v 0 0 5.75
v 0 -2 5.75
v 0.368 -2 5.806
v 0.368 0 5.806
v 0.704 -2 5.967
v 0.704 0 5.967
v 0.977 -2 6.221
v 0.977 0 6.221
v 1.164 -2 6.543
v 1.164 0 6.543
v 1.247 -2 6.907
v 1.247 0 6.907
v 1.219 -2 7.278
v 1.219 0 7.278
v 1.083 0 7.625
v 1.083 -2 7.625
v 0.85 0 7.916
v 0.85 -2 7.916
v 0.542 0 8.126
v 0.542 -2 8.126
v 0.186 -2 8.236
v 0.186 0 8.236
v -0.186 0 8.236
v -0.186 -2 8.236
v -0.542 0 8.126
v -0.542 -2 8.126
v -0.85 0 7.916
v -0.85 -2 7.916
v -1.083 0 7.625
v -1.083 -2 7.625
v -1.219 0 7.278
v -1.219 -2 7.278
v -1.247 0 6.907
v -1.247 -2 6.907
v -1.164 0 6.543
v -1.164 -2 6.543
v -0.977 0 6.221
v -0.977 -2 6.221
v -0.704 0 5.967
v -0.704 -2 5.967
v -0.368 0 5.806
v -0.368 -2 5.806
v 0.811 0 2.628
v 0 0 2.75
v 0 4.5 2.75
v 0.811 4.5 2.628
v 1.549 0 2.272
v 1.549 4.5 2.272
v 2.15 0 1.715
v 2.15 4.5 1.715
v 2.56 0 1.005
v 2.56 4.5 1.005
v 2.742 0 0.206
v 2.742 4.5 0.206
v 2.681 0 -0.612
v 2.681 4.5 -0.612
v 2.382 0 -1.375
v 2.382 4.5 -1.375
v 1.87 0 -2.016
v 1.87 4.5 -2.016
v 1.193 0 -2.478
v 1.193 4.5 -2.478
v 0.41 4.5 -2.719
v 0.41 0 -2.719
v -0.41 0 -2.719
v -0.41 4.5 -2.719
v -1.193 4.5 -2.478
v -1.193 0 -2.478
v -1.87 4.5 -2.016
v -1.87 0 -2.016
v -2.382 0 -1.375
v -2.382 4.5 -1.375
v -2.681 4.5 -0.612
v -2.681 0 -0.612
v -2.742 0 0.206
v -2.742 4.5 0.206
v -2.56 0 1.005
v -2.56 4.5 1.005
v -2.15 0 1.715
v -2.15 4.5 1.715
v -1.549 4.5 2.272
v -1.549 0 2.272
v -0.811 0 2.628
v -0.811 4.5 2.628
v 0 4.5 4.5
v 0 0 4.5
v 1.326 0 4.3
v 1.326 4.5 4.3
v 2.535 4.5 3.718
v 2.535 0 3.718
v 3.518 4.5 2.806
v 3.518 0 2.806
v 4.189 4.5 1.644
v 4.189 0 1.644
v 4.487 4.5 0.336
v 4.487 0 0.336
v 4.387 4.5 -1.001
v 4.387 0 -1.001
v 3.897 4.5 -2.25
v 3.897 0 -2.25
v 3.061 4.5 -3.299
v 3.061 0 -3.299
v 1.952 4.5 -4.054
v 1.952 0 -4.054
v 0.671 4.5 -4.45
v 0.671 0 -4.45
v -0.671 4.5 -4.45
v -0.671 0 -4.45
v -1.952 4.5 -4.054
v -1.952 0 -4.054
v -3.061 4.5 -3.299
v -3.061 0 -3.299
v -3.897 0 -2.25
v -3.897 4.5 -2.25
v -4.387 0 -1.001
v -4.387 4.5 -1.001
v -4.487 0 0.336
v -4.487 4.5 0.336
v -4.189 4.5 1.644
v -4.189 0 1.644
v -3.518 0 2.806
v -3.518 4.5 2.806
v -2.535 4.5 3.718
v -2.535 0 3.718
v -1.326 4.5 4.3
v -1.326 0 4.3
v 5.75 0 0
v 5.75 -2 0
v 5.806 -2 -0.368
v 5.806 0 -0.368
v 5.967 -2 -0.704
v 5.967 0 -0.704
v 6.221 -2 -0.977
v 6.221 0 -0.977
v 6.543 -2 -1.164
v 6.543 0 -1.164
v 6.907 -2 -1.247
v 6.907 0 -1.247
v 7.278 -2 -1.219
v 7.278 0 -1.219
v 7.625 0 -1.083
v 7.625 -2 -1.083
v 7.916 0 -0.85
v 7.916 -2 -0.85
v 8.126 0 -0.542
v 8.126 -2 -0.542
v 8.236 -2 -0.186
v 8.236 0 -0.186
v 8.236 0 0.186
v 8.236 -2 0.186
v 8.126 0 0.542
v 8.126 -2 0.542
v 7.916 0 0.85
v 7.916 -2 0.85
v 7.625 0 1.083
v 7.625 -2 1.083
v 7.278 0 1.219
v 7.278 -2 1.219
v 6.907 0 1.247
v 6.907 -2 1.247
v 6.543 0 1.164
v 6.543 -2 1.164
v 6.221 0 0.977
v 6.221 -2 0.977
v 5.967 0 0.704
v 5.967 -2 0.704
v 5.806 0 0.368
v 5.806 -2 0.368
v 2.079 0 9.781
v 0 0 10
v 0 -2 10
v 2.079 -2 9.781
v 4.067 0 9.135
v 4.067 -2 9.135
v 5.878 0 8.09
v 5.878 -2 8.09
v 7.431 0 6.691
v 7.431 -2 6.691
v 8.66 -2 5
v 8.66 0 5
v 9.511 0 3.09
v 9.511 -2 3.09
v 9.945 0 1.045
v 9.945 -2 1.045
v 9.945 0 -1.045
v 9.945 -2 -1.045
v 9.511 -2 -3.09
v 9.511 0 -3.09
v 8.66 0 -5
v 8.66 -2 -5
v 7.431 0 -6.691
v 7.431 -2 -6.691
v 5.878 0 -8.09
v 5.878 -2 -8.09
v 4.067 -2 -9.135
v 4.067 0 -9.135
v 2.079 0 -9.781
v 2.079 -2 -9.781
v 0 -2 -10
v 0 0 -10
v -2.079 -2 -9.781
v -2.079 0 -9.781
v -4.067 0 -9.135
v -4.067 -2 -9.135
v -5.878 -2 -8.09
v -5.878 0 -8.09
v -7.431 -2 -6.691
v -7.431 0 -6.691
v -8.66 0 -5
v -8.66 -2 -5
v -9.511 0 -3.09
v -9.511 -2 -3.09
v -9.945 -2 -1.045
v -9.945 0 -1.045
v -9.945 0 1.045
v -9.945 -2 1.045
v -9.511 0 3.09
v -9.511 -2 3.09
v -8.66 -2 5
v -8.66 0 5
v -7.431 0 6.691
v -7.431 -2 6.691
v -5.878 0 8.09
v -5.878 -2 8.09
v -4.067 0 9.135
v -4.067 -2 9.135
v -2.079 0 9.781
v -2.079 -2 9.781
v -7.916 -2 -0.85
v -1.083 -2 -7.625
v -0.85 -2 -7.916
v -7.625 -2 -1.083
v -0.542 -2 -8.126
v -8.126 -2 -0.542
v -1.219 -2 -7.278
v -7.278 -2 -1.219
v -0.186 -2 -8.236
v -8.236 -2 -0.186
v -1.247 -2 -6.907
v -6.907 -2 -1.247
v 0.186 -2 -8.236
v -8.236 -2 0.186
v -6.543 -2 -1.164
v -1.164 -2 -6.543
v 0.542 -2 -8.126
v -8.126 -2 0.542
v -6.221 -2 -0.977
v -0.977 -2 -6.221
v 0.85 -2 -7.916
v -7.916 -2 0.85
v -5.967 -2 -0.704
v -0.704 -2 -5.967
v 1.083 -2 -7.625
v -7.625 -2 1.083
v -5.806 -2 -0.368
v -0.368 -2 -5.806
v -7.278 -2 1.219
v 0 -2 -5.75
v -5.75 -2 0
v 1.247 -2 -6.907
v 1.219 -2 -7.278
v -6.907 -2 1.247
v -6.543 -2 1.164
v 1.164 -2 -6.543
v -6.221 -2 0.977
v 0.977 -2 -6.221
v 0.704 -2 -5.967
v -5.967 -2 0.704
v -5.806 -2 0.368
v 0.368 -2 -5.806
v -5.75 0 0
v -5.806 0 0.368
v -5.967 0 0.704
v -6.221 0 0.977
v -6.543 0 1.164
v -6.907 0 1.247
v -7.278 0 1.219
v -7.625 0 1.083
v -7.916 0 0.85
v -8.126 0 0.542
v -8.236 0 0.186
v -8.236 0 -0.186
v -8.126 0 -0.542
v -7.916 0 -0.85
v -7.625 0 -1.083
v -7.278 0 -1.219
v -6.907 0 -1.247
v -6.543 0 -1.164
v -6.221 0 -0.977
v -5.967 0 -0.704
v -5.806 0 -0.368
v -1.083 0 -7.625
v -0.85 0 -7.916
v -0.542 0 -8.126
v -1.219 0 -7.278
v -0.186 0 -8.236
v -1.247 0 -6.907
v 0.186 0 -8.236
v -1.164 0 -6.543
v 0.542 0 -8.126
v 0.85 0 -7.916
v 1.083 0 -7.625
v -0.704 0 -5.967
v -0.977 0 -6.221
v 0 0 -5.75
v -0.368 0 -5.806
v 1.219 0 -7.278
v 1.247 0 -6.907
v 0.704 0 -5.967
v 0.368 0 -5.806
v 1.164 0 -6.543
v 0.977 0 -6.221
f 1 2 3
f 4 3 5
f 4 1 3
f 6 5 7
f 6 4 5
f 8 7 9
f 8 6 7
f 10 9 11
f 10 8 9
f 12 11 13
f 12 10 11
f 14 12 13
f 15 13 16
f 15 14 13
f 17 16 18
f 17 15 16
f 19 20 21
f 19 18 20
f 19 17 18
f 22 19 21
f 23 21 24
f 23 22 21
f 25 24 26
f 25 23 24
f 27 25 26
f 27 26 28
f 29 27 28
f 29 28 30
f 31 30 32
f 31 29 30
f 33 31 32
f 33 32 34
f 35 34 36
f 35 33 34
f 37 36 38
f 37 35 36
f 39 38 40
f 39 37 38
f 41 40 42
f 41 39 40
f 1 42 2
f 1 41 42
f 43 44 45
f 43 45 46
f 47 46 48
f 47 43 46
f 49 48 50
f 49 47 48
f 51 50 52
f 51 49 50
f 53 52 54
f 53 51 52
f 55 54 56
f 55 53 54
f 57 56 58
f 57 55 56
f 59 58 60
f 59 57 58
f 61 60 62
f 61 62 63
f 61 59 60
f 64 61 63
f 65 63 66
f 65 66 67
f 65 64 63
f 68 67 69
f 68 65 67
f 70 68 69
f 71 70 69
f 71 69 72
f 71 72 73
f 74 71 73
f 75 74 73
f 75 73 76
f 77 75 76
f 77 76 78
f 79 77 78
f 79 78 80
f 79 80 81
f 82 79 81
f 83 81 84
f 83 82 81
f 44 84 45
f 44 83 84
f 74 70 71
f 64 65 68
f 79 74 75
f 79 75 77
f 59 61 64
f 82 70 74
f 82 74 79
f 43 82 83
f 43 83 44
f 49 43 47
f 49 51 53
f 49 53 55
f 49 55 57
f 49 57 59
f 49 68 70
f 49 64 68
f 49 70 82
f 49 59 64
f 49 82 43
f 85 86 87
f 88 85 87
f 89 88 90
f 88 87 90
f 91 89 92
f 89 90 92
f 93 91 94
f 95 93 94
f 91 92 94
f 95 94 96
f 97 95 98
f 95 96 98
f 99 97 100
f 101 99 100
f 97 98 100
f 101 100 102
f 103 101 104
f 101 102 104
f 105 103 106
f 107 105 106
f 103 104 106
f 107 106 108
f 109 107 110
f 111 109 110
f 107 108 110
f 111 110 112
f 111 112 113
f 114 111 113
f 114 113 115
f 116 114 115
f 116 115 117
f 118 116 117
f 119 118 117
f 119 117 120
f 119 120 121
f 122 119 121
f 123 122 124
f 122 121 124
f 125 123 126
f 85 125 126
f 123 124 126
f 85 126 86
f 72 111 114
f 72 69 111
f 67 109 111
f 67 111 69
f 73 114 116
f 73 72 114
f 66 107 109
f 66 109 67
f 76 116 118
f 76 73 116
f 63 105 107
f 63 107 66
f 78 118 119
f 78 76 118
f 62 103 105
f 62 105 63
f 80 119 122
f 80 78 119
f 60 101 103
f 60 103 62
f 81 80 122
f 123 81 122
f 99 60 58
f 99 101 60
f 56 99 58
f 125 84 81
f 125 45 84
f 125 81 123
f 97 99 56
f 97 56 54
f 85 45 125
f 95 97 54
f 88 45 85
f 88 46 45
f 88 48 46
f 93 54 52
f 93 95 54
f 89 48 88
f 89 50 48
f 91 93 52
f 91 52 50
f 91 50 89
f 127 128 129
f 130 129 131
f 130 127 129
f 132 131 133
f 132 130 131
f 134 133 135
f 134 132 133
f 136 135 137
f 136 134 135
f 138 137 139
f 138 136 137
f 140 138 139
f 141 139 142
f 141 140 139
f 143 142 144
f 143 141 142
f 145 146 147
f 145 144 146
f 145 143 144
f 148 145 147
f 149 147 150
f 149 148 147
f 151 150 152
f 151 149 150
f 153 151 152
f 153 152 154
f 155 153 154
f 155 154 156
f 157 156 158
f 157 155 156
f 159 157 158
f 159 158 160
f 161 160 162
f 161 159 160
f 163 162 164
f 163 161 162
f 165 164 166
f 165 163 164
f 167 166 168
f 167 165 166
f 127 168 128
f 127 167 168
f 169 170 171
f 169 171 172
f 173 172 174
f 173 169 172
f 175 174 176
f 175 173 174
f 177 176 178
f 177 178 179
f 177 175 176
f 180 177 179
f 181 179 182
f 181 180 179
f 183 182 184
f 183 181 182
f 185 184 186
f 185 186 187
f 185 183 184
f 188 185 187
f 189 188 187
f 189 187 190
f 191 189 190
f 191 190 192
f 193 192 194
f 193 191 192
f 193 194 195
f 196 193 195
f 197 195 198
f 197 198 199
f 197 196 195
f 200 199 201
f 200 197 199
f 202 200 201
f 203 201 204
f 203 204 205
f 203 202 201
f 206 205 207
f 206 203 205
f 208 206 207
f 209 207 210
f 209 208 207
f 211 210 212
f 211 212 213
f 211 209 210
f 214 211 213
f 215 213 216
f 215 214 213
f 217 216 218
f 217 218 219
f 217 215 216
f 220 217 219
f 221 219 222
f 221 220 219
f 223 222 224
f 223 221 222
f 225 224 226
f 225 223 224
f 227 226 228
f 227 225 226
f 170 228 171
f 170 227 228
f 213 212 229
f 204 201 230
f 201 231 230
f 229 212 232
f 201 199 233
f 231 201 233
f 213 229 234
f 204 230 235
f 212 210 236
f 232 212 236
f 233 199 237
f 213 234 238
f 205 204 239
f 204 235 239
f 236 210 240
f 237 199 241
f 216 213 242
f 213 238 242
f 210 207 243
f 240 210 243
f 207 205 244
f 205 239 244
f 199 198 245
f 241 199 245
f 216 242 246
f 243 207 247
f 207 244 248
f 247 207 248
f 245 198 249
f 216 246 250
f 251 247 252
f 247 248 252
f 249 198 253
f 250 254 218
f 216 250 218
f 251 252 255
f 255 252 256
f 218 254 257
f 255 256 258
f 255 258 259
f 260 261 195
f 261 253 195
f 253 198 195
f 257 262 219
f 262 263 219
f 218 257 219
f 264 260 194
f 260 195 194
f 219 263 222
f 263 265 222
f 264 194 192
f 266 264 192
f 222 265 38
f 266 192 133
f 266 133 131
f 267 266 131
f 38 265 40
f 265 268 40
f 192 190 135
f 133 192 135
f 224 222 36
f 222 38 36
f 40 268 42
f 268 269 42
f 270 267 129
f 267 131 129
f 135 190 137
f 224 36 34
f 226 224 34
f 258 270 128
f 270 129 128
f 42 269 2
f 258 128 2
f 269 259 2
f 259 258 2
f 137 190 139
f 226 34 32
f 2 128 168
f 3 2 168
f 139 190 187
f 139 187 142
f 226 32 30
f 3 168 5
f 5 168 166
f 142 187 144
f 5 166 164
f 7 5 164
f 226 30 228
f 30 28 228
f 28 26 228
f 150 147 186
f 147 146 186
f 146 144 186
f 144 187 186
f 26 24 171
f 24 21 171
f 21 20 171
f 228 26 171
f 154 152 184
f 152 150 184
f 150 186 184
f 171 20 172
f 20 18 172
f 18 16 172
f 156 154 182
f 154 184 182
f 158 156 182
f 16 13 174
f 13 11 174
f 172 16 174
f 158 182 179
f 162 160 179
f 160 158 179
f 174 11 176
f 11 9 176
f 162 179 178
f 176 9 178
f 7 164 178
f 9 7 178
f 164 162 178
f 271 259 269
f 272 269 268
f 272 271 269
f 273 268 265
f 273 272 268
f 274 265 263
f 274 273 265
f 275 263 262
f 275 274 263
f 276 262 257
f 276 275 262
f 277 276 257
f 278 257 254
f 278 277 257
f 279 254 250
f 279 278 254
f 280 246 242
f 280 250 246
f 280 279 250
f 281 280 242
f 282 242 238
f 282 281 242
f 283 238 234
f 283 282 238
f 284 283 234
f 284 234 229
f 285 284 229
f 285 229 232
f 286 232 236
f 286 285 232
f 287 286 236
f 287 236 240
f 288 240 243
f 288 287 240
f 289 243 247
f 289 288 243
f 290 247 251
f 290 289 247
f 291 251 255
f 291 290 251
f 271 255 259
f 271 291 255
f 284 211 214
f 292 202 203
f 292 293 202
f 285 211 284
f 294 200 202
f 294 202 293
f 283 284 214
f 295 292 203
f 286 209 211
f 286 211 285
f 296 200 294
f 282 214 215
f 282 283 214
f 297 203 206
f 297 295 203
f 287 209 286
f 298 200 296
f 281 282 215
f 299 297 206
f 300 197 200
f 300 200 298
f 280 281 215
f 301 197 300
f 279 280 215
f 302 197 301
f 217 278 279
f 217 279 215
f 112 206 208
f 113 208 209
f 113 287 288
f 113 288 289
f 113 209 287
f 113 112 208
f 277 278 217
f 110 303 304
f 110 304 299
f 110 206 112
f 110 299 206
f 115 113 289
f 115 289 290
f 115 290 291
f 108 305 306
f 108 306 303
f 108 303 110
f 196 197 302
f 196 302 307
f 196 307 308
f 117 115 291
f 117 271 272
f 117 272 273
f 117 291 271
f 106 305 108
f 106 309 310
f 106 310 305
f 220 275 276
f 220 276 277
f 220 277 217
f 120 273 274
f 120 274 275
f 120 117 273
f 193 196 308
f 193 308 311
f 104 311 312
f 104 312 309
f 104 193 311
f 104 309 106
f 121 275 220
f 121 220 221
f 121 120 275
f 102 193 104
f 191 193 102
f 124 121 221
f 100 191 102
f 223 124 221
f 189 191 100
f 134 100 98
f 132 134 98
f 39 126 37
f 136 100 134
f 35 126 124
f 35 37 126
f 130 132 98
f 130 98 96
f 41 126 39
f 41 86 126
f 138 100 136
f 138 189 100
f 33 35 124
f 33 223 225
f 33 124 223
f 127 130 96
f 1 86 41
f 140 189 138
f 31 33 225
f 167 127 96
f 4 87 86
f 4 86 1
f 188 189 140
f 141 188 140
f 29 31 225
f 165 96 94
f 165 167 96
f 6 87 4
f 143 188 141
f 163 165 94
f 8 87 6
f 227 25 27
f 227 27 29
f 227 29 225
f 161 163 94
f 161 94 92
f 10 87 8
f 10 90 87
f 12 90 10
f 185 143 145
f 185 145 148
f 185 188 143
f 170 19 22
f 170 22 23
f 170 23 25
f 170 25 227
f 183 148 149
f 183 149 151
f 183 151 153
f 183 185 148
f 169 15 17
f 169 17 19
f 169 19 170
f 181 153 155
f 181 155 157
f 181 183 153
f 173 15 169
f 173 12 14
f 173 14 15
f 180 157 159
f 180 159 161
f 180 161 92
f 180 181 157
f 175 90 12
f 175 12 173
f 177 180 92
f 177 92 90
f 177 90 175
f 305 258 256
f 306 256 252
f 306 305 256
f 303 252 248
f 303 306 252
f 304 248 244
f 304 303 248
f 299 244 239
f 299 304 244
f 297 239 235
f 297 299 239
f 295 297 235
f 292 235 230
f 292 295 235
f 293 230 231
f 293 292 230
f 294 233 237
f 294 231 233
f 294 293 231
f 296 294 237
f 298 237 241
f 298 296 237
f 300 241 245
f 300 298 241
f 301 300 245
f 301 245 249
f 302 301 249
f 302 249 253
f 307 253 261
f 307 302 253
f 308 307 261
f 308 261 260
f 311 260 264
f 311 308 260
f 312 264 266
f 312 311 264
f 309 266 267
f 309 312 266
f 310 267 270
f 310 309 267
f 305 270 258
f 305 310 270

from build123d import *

# Parameters (mm, degrees)
SKETCH2_R           = 10
BOSS_EXTRUDE1_DEPTH = 2
SKETCH2_3_R         = 4.5
SKETCH2_3_R_2       = 2.75
BOSS_EXTRUDE2_DEPTH = 4.5
CIRPATTERN1_COUNT   = 4


with BuildPart() as part:
    # Sketch2 → Boss-Extrude1 (new body)
    with BuildSketch(Plane(origin=(0, 0, 0), x_dir=(1, 0, 0), z_dir=(0, 1, 0))):
        Circle(SKETCH2_R)
    extrude(amount=-BOSS_EXTRUDE1_DEPTH)

    # Sketch2<3> → Boss-Extrude2 (add)
    with BuildSketch(Plane(origin=(0, 0, 0), x_dir=(1, 0, 0), z_dir=(0, 1, 0))):
        Circle(SKETCH2_3_R)
        Circle(SKETCH2_3_R_2, mode=Mode.SUBTRACT)
    extrude(amount=BOSS_EXTRUDE2_DEPTH)

    # Sketch5 → Tap Drill for M3x0.5 Tap1 (revolve, cut)
    with BuildSketch(Plane(origin=(0, 0, -7), x_dir=(0, 0, 1), z_dir=(1, 0, 0))):
        Polygon((0, 0), (0, 10.911075774), (1.25, 10.16), (1.25, 0), align=None)
    tap_drill_for_m3x0_5_tap1 = revolve(axis=Axis((0, 6.35, -7), (0, -1, 0)), mode=Mode.SUBTRACT)

    # CirPattern1: Tap Drill for M3x0.5 Tap1 ×4 about axis
    cirpattern1_axis = Axis((0, -2, 0), (0, 1, 0))
    for i in range(1, CIRPATTERN1_COUNT):
        add(tap_drill_for_m3x0_5_tap1.rotate(cirpattern1_axis, i * 360 / CIRPATTERN1_COUNT), mode=Mode.SUBTRACT)


solid = part.part
